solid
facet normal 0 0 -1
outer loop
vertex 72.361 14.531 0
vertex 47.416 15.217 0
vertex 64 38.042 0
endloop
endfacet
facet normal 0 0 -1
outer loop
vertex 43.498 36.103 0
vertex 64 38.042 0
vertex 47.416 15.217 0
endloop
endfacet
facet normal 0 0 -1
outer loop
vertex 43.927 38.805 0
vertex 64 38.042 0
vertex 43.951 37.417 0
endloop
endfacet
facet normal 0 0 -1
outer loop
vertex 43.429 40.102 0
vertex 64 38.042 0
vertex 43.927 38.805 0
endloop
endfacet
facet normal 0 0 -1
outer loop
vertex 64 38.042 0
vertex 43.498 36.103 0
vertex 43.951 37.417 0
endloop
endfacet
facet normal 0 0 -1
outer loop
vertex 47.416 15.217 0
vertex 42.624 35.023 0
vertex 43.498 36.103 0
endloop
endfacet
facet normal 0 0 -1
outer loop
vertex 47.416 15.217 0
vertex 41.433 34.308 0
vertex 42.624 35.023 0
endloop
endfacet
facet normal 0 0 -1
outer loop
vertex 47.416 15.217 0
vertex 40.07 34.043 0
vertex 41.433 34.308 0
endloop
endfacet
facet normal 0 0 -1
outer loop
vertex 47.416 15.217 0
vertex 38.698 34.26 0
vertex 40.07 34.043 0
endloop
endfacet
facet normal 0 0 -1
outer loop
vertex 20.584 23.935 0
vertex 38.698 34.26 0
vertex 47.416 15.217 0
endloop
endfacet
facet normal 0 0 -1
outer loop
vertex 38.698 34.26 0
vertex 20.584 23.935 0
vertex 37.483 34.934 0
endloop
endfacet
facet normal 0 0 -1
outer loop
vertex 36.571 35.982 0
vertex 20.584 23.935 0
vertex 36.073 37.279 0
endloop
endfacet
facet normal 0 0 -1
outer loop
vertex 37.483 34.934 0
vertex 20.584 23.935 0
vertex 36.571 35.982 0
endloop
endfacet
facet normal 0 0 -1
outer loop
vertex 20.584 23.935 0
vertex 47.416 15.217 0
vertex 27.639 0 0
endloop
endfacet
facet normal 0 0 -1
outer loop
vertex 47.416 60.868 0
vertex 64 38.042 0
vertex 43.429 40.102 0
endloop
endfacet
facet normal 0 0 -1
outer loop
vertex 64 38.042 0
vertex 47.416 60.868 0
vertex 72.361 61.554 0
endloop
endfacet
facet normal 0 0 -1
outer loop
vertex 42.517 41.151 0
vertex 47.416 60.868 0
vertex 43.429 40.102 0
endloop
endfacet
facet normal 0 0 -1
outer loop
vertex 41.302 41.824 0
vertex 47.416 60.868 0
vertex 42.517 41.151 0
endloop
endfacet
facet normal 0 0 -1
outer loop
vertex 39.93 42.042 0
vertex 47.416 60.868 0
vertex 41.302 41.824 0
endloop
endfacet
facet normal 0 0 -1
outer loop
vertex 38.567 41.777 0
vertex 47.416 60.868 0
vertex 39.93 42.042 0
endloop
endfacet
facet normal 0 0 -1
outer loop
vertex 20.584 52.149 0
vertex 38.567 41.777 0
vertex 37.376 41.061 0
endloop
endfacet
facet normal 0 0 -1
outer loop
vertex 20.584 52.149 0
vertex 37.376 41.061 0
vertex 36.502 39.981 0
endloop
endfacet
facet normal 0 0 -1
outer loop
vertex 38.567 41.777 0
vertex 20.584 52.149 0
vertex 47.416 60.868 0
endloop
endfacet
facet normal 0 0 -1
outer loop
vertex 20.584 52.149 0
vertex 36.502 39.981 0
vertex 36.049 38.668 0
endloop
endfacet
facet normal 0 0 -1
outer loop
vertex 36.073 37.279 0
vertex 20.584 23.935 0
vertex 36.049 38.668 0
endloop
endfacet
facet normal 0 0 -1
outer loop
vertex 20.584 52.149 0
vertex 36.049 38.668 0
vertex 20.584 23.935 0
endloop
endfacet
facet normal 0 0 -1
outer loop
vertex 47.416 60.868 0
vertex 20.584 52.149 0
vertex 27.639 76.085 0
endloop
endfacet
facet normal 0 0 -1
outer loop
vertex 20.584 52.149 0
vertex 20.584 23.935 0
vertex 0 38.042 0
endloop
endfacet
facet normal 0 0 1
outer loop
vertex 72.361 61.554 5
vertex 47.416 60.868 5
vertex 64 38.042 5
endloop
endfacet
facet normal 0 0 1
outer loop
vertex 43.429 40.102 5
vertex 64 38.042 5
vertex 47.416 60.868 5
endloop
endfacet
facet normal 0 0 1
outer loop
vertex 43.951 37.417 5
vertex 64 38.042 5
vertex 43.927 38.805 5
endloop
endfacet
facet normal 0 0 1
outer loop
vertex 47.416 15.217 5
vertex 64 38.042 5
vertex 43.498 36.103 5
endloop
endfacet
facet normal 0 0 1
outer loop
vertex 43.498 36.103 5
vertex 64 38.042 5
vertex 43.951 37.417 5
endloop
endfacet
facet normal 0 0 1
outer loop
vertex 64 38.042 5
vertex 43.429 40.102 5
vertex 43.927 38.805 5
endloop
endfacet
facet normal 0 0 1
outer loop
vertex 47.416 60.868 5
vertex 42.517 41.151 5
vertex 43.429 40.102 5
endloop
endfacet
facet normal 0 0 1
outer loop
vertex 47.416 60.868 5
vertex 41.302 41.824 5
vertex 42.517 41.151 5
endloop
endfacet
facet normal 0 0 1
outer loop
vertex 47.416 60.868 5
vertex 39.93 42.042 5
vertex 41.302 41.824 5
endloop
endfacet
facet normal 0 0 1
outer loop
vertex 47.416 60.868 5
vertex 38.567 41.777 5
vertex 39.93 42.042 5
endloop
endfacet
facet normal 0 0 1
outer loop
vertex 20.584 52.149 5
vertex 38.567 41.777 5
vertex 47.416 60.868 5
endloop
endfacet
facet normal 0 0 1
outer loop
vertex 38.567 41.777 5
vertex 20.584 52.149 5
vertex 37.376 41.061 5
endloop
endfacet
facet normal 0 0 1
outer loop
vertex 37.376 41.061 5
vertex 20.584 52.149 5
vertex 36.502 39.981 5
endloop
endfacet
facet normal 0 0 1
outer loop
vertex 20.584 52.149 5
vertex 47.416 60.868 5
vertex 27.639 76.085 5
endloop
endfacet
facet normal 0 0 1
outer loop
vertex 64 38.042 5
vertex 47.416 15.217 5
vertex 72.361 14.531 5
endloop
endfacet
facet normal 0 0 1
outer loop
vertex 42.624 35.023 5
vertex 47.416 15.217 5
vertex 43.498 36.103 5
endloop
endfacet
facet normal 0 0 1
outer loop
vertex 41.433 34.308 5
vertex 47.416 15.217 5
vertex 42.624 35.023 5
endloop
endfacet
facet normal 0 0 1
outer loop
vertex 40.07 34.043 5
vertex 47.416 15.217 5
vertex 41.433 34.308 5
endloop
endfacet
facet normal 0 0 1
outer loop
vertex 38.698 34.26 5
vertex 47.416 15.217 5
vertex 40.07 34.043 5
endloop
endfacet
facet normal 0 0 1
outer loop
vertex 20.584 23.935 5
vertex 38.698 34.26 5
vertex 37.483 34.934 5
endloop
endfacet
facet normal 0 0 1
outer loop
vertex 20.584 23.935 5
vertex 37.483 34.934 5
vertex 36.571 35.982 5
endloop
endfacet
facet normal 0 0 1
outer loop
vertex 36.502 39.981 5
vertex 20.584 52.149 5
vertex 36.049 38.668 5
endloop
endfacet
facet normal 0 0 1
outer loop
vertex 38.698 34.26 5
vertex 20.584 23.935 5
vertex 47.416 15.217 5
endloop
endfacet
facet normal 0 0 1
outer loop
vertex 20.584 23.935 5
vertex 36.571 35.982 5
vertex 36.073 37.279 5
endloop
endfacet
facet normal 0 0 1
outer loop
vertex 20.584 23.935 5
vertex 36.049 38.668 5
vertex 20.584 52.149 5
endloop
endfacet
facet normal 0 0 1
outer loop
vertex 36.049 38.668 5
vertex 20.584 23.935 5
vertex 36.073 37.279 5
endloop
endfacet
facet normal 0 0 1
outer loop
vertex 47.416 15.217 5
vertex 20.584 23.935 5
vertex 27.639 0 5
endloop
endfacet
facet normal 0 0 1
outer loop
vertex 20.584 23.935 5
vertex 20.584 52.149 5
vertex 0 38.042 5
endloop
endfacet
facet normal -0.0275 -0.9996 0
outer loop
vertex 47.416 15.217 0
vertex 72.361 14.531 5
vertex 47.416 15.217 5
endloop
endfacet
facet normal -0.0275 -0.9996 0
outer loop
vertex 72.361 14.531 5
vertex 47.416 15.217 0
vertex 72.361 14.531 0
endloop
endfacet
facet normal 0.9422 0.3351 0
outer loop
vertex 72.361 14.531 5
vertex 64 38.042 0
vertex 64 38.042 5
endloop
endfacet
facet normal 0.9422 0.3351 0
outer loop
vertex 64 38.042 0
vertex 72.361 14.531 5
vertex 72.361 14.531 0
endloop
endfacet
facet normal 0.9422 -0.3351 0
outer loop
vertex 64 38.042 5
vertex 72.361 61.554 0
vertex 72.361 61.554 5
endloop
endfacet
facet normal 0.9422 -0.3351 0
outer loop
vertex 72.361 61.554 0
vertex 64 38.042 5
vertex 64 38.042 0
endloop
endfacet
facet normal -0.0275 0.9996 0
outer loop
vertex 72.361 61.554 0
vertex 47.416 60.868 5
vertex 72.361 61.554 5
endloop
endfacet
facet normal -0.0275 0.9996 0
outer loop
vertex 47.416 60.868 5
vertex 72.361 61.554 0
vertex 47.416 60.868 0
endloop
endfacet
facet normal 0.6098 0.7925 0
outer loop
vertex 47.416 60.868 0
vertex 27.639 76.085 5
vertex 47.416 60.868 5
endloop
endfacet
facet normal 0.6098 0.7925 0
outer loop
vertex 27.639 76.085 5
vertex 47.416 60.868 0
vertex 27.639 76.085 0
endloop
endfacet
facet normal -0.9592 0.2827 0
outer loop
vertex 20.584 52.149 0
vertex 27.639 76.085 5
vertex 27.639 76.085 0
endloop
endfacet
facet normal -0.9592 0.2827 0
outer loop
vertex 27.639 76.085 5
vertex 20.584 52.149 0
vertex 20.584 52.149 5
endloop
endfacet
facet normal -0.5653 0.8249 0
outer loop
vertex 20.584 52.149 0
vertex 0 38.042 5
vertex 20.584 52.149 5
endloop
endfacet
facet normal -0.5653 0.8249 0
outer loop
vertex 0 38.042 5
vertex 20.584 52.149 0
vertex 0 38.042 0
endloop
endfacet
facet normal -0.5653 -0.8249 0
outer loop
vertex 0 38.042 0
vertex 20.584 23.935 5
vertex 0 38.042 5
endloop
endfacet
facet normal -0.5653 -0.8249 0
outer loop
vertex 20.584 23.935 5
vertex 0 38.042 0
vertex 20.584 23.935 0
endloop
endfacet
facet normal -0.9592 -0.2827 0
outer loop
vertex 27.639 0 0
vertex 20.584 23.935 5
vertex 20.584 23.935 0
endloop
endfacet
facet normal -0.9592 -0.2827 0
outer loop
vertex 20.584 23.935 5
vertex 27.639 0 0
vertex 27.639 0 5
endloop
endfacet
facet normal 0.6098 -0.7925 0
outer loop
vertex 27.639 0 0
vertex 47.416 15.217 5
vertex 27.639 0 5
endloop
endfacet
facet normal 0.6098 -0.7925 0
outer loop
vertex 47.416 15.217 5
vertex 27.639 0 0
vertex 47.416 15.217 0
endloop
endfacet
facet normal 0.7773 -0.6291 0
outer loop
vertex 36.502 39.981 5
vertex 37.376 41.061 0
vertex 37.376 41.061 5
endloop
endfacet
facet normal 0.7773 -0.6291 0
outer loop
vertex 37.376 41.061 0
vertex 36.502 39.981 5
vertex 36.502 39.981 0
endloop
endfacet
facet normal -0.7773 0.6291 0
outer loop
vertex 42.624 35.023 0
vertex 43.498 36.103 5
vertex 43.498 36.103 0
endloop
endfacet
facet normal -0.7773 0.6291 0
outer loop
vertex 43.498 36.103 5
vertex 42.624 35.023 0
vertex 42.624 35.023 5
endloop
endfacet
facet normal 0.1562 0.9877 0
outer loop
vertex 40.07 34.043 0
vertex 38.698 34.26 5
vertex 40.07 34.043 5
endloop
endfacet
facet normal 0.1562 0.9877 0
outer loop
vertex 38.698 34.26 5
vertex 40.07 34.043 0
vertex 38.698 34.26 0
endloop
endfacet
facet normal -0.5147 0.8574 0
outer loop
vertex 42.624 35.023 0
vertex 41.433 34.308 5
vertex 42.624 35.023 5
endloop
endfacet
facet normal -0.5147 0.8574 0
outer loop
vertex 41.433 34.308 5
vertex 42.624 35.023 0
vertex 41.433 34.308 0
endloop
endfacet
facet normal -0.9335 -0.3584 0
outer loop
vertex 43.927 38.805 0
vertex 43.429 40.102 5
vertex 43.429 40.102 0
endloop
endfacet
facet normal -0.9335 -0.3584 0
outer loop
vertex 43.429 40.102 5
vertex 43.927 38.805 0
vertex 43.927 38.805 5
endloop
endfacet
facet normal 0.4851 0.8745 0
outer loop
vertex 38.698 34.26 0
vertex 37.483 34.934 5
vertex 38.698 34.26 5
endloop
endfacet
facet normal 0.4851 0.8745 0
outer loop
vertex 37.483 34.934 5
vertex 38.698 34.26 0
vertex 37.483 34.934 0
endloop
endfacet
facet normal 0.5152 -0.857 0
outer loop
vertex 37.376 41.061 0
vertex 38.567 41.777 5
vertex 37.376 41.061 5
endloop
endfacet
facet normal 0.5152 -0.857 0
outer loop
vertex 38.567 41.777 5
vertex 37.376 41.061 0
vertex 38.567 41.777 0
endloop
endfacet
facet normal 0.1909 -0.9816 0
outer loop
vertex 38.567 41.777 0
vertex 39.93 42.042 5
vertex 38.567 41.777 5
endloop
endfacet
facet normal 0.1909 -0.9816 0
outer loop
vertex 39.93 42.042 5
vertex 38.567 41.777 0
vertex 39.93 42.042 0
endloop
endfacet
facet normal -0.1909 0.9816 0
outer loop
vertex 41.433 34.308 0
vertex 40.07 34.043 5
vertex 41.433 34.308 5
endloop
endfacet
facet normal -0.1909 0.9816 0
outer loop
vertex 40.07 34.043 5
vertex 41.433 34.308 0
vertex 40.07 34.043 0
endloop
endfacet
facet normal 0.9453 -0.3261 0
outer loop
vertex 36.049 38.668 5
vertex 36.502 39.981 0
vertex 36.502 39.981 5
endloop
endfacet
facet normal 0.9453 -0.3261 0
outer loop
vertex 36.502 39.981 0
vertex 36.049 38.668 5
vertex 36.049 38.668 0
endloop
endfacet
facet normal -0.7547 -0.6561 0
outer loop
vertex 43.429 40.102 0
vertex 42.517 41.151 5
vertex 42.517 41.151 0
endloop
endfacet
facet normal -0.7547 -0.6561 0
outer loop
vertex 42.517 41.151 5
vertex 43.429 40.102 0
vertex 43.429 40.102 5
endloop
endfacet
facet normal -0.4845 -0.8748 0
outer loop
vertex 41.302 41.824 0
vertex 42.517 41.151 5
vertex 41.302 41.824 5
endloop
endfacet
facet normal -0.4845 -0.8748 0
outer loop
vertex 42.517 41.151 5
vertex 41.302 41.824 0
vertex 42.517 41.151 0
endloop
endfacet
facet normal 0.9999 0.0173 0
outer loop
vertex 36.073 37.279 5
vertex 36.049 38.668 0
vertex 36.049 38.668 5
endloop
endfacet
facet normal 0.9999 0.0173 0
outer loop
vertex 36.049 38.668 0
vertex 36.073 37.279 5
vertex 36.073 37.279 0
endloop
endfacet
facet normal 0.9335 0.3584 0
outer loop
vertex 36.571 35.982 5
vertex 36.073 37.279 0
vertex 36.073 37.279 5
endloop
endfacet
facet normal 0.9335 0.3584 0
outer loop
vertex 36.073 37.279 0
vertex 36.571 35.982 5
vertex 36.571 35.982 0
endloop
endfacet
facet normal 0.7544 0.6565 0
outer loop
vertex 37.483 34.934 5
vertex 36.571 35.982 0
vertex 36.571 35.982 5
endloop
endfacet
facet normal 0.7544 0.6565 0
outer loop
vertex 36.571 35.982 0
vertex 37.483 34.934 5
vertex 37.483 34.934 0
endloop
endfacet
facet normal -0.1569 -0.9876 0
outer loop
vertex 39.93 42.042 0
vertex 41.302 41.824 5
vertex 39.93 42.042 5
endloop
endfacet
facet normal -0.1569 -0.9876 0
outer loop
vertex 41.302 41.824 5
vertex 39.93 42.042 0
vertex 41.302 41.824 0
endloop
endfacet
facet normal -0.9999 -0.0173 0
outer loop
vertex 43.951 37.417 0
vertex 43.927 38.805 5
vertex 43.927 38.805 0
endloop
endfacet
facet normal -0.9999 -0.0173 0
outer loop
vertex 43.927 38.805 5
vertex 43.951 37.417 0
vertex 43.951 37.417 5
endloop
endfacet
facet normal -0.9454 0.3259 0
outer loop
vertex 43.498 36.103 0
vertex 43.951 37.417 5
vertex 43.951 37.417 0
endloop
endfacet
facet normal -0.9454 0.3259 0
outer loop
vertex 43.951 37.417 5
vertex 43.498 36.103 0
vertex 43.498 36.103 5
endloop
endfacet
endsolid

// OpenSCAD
$fn = 32;

// ----------------------------------------------------------------------
// Star wheel: 5-point star, R40
// ----------------------------------------------------------------------

// --- parameters (mm) ---
n_points = 5;             // number of points / teeth
r_out = 40;               // tip radius
r_in = 24;                // root radius
bore_r = 4;               // centre bore radius
plate_t = 5;              // plate thickness, Z (extrusion height)
bore_d = 8;               // centre bore diameter

profile = [[0, 38.042], [20.584, 23.935], [27.639, 0], [47.416, 15.217], [72.361, 14.531], [64, 38.042], [72.361, 61.554], [47.416, 60.868], [27.639, 76.085], [20.584, 52.149]];  // primary outline, 10 points, counter clockwise
void_1 = [[43.927, 38.805], [43.429, 40.102], [42.517, 41.151], [41.302, 41.824], [39.93, 42.042], [38.567, 41.777], [37.376, 41.061], [36.502, 39.981], [36.049, 38.668], [36.073, 37.279], [36.571, 35.982], [37.483, 34.934], [38.698, 34.26], [40.07, 34.043], [41.433, 34.308], [42.624, 35.023], [43.498, 36.103], [43.951, 37.417]];  // centre bore, 18 points

// --- the one profile operation ---
difference() {
  linear_extrude(height = plate_t) polygon(points = profile);
  translate([0, 0, -1])
    linear_extrude(height = plate_t + 2) polygon(points = void_1);
}
